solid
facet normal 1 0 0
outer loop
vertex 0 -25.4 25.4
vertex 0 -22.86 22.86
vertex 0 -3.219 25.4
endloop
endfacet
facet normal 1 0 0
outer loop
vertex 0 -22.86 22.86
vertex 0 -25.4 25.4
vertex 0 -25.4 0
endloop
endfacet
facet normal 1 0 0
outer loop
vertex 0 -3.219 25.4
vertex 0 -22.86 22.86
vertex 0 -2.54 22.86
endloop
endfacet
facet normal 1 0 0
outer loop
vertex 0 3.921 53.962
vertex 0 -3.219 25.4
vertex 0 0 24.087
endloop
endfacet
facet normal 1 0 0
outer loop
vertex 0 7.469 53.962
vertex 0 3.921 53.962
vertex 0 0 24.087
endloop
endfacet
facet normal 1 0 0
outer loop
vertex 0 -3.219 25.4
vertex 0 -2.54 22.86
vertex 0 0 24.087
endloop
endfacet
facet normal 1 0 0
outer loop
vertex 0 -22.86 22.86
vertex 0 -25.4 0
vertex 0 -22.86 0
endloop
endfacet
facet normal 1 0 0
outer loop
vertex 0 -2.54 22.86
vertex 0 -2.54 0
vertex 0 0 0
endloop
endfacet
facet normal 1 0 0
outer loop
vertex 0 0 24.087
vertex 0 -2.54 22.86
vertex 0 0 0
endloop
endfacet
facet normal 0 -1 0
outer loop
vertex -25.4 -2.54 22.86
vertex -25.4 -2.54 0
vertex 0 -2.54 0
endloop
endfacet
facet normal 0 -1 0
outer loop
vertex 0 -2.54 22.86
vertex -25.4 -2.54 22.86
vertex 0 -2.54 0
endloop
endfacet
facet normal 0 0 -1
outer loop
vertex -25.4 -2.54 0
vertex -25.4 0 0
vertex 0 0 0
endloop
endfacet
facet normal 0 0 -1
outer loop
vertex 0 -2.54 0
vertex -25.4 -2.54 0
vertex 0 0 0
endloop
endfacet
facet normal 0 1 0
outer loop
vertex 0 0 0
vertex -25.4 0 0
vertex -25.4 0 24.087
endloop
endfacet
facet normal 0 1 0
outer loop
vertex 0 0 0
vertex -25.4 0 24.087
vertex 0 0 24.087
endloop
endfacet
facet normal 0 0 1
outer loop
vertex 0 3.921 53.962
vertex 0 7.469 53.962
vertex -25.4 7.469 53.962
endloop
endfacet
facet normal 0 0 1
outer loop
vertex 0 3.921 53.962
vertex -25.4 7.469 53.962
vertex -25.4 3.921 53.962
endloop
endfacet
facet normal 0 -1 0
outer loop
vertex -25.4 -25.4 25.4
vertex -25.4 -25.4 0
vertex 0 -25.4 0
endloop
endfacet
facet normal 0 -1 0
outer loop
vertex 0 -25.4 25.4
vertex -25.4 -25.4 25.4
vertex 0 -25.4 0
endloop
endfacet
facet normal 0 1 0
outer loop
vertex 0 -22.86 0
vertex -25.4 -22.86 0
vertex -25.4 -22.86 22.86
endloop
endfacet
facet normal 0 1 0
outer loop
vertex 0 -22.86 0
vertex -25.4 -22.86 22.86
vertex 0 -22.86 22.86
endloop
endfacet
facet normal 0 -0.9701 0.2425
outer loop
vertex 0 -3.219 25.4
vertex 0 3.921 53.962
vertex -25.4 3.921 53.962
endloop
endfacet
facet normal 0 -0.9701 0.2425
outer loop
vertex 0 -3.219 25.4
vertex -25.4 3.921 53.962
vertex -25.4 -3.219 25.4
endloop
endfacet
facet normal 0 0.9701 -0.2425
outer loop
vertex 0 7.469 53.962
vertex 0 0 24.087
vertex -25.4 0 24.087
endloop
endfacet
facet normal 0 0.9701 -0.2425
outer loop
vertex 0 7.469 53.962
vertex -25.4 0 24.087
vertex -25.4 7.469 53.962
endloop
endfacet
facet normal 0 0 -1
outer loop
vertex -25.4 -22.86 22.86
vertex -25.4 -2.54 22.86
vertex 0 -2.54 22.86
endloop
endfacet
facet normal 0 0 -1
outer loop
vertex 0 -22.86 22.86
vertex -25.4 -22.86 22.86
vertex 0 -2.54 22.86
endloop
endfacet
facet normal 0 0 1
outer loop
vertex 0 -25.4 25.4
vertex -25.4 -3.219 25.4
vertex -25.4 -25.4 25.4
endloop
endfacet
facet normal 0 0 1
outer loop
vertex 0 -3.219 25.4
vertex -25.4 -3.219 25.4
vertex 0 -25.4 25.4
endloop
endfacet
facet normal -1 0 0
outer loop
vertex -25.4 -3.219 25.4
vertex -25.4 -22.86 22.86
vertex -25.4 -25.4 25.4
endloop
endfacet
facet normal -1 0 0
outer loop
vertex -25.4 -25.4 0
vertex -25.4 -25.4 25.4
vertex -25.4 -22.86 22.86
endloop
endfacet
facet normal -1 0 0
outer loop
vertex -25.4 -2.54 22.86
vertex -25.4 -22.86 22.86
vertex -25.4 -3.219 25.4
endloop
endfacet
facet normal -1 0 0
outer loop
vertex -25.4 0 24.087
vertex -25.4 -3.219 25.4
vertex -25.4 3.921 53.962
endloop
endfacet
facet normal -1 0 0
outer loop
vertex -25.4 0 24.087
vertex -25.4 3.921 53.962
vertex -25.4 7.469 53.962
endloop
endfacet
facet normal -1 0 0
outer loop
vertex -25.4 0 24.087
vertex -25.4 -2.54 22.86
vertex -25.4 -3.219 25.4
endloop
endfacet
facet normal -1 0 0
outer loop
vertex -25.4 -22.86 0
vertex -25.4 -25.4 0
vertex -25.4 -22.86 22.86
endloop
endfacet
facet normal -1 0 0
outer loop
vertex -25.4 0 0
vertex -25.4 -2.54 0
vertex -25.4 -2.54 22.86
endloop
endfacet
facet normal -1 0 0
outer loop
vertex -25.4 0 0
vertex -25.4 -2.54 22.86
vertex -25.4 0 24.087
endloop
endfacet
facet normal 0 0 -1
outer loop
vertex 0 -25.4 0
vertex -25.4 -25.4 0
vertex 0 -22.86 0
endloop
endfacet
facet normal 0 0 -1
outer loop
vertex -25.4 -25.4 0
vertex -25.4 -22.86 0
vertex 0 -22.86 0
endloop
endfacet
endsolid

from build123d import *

# Parameters (mm, degrees)
F0_W     = 25.4
F0_H     = 25.4
F1_DEPTH = 25.4
F2_T     = -2.54
F4_DEPTH = 25.4


with BuildPart() as f1:
    # F0 (on Top) → F1 (new body)
    with BuildSketch(Plane.XY):
        with Locations((-12.7, -12.7)):
            Rectangle(F0_W, F0_H)
    extrude(amount=F1_DEPTH)

    # F2
    f2_openings = [f1.faces().sort_by_distance(p)[0] for p in [
        (0, -12.7, 12.7),
        (-25.4, -12.7, 12.7),
        (-12.7, -12.7, 0),
    ]]
    offset(amount=F2_T, openings=f2_openings)

    # F3 (on Right) → F4 (join)
    with BuildSketch(Plane.YZ):
        Polygon((-3.526252, 24.17282), (0, 24.087025), (7.468844, 53.962406), (3.921144, 53.962406), align=None)
    extrude(amount=-F4_DEPTH)


solid = f1.part
